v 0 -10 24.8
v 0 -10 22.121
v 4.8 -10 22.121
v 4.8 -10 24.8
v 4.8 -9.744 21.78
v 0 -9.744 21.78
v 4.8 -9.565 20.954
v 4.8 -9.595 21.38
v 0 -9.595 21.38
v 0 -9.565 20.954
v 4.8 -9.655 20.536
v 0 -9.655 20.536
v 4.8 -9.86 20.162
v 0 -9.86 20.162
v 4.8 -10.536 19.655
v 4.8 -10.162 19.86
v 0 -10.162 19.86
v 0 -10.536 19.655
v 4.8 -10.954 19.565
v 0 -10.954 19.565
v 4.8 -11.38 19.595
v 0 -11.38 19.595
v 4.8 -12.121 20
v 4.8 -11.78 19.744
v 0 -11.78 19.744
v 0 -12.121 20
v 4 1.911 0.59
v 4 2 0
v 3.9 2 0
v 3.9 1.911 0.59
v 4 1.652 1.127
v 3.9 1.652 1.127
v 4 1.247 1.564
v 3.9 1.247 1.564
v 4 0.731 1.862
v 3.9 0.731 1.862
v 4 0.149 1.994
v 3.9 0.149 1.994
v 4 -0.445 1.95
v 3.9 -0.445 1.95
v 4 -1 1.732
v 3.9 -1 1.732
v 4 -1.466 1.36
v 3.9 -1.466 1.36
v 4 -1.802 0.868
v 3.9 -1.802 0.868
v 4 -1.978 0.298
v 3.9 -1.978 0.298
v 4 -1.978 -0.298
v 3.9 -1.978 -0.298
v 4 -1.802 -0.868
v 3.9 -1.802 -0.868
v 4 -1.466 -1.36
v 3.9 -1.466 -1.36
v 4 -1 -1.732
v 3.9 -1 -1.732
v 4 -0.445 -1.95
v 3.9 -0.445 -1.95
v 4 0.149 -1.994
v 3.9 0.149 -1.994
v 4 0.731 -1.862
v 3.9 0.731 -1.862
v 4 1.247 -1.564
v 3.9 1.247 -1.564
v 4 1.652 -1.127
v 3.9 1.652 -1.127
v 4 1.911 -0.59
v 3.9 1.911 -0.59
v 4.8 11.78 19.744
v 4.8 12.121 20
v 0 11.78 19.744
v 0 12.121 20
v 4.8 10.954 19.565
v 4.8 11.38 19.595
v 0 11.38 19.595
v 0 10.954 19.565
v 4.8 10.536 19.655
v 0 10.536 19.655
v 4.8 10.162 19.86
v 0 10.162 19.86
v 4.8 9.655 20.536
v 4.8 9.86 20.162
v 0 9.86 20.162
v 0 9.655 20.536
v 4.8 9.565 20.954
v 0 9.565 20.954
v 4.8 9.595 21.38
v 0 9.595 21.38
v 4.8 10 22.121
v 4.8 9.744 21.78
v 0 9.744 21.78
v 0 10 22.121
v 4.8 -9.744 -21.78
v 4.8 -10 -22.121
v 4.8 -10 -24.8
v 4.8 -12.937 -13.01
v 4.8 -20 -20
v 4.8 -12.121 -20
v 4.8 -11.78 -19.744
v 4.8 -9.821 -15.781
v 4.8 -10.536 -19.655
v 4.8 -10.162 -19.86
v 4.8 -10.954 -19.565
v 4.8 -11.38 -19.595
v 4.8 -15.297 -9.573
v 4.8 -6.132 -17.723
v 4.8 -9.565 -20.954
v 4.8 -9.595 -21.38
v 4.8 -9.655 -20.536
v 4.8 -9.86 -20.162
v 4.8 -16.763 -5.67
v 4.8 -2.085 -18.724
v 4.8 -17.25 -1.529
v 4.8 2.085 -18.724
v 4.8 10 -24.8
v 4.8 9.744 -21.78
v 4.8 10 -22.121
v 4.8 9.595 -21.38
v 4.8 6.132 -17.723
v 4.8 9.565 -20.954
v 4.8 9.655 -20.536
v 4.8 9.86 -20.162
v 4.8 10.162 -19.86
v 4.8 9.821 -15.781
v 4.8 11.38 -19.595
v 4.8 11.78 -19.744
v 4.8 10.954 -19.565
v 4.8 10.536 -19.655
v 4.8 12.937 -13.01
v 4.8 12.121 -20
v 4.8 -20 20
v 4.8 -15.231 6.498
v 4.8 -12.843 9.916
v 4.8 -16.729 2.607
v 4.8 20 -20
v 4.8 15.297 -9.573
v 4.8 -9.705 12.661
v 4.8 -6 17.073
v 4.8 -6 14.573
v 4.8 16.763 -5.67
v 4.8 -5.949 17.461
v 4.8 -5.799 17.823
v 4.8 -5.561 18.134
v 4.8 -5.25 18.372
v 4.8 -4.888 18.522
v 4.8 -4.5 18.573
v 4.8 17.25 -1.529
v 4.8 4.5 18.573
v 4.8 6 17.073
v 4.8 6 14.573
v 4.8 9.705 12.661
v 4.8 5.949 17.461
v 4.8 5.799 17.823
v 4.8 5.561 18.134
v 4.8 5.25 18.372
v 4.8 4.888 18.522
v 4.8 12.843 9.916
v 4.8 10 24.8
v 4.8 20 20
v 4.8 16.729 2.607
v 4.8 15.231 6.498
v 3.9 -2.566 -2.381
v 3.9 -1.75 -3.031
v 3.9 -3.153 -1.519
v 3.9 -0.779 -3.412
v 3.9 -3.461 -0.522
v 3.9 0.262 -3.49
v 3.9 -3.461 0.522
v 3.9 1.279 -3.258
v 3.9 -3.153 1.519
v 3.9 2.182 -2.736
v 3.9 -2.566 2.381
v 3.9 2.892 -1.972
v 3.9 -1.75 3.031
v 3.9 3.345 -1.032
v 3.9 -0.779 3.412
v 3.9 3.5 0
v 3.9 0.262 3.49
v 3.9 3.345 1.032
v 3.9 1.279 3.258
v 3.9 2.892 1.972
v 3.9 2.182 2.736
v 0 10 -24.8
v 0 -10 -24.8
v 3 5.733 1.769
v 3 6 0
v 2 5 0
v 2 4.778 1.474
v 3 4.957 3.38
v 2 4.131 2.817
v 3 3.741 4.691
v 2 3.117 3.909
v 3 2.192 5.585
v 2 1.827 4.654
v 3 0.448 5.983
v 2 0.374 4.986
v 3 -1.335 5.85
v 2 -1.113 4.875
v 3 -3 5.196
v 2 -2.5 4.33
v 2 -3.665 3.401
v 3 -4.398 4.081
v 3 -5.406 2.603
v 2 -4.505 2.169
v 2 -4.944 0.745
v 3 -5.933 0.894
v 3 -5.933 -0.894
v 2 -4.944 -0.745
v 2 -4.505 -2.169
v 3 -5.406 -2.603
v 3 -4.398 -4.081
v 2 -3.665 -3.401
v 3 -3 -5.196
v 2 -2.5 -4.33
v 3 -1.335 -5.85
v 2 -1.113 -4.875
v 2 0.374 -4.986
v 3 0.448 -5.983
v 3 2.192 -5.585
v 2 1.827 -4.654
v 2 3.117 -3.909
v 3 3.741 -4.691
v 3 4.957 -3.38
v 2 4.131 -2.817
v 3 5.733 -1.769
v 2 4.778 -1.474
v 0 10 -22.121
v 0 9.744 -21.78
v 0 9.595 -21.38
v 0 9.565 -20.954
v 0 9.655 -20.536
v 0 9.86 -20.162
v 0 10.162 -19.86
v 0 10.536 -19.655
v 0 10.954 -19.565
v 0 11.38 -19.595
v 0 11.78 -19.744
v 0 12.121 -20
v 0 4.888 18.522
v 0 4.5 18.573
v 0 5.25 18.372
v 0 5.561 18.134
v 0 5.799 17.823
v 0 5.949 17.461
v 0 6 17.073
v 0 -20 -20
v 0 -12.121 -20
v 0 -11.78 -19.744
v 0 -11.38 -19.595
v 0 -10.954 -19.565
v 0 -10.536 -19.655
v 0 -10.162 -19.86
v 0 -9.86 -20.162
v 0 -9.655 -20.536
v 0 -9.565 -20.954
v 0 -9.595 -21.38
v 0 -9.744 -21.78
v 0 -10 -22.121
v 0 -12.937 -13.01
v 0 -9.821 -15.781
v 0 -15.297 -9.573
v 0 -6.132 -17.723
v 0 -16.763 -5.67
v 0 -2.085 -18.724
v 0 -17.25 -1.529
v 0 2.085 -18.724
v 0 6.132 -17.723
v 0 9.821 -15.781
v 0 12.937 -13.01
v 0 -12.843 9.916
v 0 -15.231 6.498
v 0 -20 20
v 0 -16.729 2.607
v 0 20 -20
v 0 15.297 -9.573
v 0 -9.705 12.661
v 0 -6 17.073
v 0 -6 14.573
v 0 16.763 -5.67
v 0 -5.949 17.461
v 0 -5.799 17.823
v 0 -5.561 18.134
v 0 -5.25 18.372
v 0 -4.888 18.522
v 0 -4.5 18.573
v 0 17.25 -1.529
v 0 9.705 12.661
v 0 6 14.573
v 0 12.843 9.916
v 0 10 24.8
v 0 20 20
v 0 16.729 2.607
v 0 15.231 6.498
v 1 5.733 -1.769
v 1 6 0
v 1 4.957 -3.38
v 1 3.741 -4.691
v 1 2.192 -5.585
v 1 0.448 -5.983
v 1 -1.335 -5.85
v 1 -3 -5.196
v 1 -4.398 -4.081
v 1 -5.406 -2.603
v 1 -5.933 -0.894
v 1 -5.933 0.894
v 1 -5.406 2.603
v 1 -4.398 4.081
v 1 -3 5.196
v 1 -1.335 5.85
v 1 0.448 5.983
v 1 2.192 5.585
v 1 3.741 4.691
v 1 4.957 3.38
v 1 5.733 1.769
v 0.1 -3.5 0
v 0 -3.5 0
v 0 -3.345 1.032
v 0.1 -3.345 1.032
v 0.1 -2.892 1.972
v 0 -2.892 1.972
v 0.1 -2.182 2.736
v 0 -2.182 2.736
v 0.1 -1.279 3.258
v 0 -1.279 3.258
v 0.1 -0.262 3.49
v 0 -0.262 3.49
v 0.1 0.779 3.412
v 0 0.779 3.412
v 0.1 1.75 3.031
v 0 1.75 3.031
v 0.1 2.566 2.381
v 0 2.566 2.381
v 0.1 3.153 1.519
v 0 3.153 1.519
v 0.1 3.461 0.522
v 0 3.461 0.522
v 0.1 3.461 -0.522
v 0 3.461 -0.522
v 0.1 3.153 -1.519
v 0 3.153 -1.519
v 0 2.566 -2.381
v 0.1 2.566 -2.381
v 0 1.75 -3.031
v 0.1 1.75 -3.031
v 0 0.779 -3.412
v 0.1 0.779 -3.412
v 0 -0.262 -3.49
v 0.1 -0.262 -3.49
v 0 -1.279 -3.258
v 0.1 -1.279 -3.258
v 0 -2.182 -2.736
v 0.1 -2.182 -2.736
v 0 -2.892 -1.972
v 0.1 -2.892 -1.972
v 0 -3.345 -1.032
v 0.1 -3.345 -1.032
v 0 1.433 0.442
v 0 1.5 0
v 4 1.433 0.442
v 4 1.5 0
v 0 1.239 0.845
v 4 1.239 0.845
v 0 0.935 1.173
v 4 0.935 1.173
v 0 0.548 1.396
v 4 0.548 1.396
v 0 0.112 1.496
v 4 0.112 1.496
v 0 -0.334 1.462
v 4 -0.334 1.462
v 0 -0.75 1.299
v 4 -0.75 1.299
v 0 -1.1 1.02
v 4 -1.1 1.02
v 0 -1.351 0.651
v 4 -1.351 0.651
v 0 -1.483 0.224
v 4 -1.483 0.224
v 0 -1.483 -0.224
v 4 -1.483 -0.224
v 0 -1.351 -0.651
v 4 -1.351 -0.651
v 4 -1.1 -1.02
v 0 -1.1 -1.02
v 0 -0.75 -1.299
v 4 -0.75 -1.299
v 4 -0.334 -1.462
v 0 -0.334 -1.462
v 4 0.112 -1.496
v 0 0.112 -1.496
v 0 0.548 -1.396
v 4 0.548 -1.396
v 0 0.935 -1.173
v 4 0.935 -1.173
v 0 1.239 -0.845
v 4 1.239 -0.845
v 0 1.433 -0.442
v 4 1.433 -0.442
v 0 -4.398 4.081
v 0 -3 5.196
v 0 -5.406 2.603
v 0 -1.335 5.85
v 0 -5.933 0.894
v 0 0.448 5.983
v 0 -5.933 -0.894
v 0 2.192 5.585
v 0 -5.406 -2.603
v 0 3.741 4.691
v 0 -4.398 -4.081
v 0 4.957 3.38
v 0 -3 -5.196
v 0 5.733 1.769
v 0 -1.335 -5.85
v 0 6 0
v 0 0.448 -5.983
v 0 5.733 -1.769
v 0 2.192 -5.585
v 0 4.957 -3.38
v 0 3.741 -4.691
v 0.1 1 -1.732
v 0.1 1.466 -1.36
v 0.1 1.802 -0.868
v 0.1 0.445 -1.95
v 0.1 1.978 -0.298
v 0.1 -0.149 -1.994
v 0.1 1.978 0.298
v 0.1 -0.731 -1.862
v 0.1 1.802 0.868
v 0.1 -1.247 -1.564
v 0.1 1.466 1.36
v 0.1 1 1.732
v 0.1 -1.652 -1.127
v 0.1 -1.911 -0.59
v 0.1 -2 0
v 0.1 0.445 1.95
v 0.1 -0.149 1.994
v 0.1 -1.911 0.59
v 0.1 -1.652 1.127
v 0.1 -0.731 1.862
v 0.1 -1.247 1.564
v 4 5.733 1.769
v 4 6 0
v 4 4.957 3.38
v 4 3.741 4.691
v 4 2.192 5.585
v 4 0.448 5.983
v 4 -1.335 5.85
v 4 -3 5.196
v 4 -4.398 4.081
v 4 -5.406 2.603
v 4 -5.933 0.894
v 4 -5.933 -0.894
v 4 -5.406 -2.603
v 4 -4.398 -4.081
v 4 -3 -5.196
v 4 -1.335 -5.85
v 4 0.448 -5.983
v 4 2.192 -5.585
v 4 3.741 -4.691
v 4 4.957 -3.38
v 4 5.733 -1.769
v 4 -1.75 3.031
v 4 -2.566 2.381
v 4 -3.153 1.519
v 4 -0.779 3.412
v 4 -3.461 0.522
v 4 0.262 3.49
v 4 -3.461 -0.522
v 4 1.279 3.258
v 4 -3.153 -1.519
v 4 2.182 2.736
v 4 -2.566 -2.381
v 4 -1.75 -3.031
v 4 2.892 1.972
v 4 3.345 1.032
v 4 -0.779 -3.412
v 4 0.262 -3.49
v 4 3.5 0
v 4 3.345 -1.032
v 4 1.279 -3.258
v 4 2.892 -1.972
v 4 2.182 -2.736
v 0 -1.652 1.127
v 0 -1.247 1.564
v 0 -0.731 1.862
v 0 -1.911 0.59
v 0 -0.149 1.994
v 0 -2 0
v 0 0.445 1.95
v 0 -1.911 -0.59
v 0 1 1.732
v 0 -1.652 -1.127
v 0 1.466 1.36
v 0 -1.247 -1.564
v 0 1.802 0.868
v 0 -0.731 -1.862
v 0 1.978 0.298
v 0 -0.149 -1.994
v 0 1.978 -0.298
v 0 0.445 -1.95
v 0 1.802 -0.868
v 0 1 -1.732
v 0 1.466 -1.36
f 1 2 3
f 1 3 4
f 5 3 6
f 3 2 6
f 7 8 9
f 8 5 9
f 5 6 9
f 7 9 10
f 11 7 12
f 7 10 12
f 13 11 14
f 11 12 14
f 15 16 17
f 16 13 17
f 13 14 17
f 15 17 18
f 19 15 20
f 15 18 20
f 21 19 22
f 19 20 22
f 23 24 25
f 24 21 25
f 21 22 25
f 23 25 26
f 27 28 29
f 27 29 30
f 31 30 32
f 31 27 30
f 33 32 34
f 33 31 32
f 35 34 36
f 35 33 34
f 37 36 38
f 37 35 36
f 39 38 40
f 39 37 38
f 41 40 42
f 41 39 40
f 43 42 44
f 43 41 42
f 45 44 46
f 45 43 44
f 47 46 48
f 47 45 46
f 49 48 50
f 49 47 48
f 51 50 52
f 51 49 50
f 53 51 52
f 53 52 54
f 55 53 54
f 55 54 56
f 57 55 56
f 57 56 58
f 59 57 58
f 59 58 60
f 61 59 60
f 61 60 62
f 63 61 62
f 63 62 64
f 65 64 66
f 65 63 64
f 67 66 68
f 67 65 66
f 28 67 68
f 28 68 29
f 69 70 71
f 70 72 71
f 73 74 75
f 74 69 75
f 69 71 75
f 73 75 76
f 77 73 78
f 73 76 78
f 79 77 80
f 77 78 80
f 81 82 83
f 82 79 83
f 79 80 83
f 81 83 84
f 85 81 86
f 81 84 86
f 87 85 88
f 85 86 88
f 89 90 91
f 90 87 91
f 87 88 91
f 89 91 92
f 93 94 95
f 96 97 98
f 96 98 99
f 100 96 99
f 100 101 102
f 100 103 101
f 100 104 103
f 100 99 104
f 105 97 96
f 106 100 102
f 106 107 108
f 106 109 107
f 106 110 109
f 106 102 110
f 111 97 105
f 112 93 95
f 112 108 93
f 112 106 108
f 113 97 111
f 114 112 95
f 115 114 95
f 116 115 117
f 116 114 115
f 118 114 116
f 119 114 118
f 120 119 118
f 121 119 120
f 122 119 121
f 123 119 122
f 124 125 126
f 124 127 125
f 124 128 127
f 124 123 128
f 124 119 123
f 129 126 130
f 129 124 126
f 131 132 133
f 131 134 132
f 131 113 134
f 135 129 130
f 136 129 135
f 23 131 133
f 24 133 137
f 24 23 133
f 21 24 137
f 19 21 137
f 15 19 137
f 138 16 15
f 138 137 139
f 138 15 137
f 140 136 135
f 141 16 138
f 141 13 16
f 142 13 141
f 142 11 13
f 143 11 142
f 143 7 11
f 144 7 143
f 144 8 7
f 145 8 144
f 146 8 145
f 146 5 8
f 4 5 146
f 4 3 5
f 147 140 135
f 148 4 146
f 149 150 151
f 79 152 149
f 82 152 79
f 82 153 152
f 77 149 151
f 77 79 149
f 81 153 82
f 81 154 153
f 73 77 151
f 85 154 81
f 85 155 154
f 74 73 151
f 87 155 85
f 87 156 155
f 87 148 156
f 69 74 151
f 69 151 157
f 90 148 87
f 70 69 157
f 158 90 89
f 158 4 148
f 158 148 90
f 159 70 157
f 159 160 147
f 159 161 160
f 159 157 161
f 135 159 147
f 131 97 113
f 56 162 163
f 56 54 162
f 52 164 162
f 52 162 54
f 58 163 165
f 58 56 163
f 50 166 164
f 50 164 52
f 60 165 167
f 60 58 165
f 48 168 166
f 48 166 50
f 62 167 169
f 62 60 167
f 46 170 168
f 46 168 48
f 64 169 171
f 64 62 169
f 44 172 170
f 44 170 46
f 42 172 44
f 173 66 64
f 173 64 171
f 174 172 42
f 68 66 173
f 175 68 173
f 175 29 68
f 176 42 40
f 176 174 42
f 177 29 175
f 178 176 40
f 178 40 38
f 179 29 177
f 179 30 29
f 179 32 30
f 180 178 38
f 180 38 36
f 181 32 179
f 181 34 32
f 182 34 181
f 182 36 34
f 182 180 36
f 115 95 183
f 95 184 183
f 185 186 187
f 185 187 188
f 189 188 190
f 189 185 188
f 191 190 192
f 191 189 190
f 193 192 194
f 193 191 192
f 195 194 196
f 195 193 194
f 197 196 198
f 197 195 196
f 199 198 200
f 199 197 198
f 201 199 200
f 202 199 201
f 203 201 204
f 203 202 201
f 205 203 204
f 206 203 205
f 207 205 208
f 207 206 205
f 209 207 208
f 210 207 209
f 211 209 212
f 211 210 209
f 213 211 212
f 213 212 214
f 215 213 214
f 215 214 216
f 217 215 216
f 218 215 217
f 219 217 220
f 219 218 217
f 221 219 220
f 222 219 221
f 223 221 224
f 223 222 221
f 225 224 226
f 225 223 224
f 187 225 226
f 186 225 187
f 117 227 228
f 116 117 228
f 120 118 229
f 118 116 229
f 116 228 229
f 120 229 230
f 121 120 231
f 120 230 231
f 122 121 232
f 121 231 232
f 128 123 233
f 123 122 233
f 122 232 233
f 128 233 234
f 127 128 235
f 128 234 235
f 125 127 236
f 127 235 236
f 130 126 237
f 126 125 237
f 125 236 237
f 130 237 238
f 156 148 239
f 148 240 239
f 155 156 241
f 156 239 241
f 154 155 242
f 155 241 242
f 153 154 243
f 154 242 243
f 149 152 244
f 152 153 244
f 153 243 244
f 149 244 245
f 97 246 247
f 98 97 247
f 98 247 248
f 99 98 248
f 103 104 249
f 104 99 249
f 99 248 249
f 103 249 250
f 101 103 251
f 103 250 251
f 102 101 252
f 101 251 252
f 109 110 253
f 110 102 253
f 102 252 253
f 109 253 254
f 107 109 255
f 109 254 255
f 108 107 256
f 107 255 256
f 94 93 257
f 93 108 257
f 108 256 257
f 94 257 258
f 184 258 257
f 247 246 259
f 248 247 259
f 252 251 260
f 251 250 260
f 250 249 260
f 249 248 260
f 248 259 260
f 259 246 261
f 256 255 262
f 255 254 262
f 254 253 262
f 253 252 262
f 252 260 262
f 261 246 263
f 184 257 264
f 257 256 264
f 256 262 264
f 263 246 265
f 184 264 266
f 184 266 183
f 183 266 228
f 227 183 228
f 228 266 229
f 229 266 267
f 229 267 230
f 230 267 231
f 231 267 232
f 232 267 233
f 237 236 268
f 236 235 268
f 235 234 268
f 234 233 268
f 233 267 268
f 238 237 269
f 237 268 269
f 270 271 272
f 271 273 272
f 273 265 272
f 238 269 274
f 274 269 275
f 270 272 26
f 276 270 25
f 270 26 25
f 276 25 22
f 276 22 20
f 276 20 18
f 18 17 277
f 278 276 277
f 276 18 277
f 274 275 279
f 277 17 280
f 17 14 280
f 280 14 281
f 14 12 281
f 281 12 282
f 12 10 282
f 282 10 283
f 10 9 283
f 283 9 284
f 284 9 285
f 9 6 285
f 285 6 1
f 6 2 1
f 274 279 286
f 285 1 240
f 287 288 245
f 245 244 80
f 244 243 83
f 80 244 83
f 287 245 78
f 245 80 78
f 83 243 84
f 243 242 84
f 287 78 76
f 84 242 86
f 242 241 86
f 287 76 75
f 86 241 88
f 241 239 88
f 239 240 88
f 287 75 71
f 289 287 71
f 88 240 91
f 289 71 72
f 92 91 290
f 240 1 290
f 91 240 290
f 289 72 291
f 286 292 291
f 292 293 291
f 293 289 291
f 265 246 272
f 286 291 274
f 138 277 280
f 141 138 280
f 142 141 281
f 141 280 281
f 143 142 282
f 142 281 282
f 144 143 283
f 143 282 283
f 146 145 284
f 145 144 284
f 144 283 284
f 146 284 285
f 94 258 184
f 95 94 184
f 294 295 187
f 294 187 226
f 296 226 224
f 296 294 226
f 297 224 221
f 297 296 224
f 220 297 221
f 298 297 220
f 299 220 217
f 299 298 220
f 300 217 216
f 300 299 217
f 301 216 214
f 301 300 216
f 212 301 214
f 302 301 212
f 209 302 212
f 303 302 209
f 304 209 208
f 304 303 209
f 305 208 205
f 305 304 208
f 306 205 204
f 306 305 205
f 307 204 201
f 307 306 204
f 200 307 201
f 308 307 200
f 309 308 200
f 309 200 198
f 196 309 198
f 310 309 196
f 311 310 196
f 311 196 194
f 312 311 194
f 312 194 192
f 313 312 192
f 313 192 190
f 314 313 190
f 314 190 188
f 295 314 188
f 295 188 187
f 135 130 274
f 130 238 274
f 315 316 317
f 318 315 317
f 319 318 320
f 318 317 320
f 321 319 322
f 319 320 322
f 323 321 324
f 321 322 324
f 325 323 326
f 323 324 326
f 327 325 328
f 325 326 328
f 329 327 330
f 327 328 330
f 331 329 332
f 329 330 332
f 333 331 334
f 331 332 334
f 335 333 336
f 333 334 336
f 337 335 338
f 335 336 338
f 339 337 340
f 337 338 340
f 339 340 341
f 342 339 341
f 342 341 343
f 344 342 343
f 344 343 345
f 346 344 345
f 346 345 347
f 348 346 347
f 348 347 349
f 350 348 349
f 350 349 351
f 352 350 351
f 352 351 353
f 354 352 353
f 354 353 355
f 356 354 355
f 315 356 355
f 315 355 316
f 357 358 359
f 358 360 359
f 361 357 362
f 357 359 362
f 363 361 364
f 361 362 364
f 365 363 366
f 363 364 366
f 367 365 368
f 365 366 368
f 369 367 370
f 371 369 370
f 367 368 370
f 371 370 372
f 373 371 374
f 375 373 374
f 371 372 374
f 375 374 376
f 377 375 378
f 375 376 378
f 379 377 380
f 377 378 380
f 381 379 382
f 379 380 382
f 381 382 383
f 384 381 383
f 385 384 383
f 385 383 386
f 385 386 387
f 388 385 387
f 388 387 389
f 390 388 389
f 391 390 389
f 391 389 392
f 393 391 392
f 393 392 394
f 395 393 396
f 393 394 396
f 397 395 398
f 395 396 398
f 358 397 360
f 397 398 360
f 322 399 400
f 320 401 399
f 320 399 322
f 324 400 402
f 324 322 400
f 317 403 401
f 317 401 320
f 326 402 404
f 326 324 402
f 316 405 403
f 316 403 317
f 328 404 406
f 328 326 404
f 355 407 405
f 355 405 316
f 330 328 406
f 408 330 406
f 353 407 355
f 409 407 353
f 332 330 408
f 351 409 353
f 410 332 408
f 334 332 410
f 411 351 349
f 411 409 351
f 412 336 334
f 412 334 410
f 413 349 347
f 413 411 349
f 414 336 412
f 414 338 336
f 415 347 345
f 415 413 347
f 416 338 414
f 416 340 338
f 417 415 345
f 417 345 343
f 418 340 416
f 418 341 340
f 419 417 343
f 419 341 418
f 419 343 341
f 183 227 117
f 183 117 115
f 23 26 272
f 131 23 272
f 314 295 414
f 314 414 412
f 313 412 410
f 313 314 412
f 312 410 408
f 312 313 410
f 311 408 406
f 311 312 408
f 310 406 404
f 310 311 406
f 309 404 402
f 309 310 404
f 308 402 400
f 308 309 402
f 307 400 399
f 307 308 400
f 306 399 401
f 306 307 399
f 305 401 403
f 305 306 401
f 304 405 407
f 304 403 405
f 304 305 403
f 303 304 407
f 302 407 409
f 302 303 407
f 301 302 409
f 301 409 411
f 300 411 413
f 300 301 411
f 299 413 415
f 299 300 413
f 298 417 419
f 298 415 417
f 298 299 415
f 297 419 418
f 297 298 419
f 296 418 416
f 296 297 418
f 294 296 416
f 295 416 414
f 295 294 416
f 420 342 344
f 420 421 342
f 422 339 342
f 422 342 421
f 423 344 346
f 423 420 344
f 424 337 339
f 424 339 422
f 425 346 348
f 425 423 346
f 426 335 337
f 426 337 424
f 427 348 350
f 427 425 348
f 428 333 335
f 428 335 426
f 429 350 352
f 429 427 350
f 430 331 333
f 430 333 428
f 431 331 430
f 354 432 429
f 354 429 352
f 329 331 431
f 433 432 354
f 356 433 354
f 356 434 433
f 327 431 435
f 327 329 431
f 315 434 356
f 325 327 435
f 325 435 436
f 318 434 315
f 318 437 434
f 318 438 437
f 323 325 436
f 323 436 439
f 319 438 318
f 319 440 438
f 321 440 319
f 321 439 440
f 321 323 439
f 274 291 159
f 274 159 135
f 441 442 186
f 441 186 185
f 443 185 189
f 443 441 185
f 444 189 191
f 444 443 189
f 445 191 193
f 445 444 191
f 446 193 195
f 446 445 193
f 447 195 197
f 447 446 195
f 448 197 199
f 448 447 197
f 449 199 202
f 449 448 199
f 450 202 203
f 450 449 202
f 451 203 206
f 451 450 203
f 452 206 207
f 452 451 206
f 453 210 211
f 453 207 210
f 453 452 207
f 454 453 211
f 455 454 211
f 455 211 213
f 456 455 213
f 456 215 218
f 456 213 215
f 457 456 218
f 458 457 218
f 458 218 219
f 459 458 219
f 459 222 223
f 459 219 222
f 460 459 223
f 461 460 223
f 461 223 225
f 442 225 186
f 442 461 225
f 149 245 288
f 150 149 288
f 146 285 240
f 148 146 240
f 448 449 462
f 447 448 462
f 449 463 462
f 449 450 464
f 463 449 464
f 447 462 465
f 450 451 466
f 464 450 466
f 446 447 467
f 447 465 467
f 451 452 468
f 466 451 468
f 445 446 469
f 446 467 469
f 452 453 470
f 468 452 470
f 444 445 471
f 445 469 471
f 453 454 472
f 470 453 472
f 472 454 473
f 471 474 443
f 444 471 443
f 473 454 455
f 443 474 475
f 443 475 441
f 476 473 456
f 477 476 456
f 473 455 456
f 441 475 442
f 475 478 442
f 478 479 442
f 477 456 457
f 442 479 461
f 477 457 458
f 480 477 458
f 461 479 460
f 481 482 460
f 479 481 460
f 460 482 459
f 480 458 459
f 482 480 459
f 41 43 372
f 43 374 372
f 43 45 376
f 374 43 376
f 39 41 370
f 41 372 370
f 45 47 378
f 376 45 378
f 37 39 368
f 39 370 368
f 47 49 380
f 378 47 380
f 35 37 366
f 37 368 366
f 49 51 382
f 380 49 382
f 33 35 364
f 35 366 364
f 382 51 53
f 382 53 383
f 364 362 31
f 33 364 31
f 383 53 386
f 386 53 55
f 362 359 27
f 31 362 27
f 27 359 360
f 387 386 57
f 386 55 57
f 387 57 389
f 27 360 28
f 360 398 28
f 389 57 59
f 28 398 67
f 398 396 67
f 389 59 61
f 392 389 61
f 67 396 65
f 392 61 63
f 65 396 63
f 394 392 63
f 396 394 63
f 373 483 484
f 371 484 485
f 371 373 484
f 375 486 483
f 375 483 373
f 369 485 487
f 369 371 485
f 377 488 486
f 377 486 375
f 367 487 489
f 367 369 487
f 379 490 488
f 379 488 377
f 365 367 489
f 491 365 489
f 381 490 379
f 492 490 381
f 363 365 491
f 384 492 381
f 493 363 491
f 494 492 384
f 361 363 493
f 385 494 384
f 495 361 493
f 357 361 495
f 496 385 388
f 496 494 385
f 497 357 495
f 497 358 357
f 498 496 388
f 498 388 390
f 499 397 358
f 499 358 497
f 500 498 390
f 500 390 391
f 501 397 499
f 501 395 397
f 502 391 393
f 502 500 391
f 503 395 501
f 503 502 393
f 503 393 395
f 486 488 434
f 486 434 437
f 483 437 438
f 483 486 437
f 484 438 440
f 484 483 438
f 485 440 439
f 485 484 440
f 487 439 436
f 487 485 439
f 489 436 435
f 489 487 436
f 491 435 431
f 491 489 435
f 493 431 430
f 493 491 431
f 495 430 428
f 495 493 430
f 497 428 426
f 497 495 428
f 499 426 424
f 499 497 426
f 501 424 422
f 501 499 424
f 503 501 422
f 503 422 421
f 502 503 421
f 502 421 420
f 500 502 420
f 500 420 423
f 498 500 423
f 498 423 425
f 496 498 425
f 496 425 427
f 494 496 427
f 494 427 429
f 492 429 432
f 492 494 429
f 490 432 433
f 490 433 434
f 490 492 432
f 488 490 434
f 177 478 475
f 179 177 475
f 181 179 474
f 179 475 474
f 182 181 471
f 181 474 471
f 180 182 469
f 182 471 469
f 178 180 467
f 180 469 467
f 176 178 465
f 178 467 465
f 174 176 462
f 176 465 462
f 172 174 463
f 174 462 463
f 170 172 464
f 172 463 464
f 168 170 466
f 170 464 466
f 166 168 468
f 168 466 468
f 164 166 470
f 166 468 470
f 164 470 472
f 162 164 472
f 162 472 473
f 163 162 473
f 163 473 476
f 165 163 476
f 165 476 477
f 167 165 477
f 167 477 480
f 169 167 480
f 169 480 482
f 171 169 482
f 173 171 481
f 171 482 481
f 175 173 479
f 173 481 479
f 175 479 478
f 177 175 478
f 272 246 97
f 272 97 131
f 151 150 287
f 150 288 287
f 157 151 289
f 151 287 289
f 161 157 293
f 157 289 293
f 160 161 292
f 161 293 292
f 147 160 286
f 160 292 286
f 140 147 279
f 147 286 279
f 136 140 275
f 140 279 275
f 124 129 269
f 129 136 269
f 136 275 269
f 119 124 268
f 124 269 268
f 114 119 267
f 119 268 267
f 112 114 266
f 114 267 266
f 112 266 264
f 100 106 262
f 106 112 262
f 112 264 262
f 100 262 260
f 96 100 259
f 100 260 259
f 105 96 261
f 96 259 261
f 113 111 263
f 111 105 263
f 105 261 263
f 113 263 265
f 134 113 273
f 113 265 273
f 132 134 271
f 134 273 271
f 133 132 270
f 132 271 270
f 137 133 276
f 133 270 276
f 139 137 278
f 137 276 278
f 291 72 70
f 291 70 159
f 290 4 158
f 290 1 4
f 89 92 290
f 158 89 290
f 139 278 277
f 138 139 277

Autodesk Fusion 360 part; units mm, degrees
sketch "Sketch2" plane through (0, 0, 0) normal (0, 0, 1) x (1, 0, 0)
  line L0 (0, 0) -> (0, 6)
  line L1 (4, 6) -> (4, 0)
  line L2 (4, 0) -> (0, 0)
  line L3 (1, 6) -> (2, 5)
  line L4 (2, 5) -> (3, 6)
  line L5 (0, 6) -> (1, 6)
  line L6 (3, 6) -> (4, 6)
  dimension "d12" = 4
  dimension "d13" = 1
  dimension "d14" = 1
  dimension "d15" = 6
revolve "Revolve1" add sketch "Sketch2" angle 360 about axis through (4, 0, 0) along (-1, 0, 0)
sketch "Sketch3" plane through (4, 0, 0) normal (1, 0, 0) x (0, 1, 0)
  circle A0 centre (0, 0) radius 6
  circle A1 centre (0, 0) radius 1.5
  dimension "d18" = 3
extrude "Extrude2" cut sketch "Sketch3" against normal through all contours A1
sketch "Sketch4" plane through (4, 0, 0) normal (1, 0, 0) x (0, 1, 0)
  circle A0 centre (0, 0) radius 1.5
  circle A1 centre (0, 0) radius 6
  circle A2 centre (0, 0) radius 3.5
  circle A3 centre (0, 0) radius 2
  dimension "d20" = 7
  dimension "d21" = 4
extrude "Extrude3" cut sketch "Sketch4" against normal blind 0.1 contours A2
sketch "Sketch5" plane through (0, 0, 0) normal (-1, 0, 0) x (0, -1, 0)
  circle A0 centre (0, 0) radius 1.5
  circle A1 centre (0, 0) radius 6
  circle A2 centre (0, 0) radius 2
  circle A3 centre (0, 0) radius 3.5
  dimension "d24" = 7
  dimension "d25" = 4
extrude "Extrude4" cut sketch "Sketch5" against normal blind 0.1 contours A3

Autodesk Fusion 360 part; units mm, degrees
sketch "Sketch1" plane through (0, 0, 0) normal (1, 0, 0) x (0, 1, 0)
  line L0 (-20, 20) -> (20, 20) construction
  line L1 (20, 20) -> (20, -20)
  line L2 (20, -20) -> (-20, -20) construction
  line L3 (-20, -20) -> (-20, 20)
  line L4 (0, 0) -> (0, 20) construction
  line L5 (0, 0) -> (20, 0) construction
  line L6 (0, 0) -> (0, -1.6) construction
  line L7 (0, 0) -> (0, -8.6) construction
  circle A0 centre (0, -8.6) radius 6
  circle A1 centre (0, -1.6) radius 18.4 construction
  circle A2 centre (0, -1.6) radius 15.5 construction
  line L8 (0, -1.6) -> (15.5, -1.6) construction
  circle A3 centre (15.5, -1.6) radius 1.5
  circle A4 centre (7.75, 11.8234) radius 1.5
  circle A5 centre (-7.75, 11.8234) radius 1.5
  circle A6 centre (-15.5, -1.6) radius 1.5
  circle A7 centre (-7.75, -15.0234) radius 1.5
  circle A8 centre (7.75, -15.0234) radius 1.5
  line L9 (-10, 20) -> (-10, 24.8) construction
  line L10 (-10, 24.8) -> (10, 24.8)
  line L11 (10, 24.8) -> (10, 20) construction
  line L12 (-10, -20) -> (-10, -24.8) construction
  line L13 (-10, -24.8) -> (10, -24.8)
  line L14 (10, -24.8) -> (10, -20) construction
  line L15 (-11.0607, -21.0607) -> (-10, -20) construction
  line L16 (11.0607, -21.0607) -> (10, -20) construction
  line L17 (-11.0607, 21.0607) -> (-10, 20) construction
  line L18 (11.0607, 21.0607) -> (10, 20) construction
  arc A9 (-12.1213, 20) -> (-10, 22.1213) centre (-11.0607, 21.0607) ccw
  arc A10 (-10, 22.1213) -> (-12.1213, 20) centre (-11.0607, 21.0607) ccw construction
  arc A11 (10, 22.1213) -> (12.1213, 20) centre (11.0607, 21.0607) ccw
  arc A12 (12.1213, 20) -> (10, 22.1213) centre (11.0607, 21.0607) ccw construction
  arc A13 (12.1213, -20) -> (10, -22.1213) centre (11.0607, -21.0607) ccw
  arc A14 (10, -22.1213) -> (12.1213, -20) centre (11.0607, -21.0607) ccw construction
  arc A15 (-10, -22.1213) -> (-12.1213, -20) centre (-11.0607, -21.0607) ccw
  arc A16 (-12.1213, -20) -> (-10, -22.1213) centre (-11.0607, -21.0607) ccw construction
  line L19 (-10, 22.1213) -> (-10, 24.8)
  line L20 (-12.1213, 20) -> (-20, 20)
  line L21 (10, 22.1213) -> (10, 24.8)
  line L22 (12.1213, 20) -> (20, 20)
  line L23 (10, -22.1213) -> (10, -24.8)
  line L24 (12.1213, -20) -> (20, -20)
  line L25 (-10, -22.1213) -> (-10, -24.8)
  line L26 (-12.1213, -20) -> (-20, -20)
  dimension "d61" = 40
  dimension "d62" = 40
  dimension "d63" = 1.6
  dimension "d65" = 12
  dimension "d66" = 36.8
  dimension "d67" = 31
  dimension "d68" = 3
  dimension "d70" = 360
  dimension "d71" = 4.8
  dimension "d72" = 20
  dimension "d73" = 10
  dimension "d74" = 4.8
  dimension "d75" = 20
  dimension "d76" = 10
  dimension "d77" = 3
  dimension "d78" = 1.5
  dimension "d79" = 45
  dimension "d80" = 3
  dimension "d81" = 1.5
  dimension "d83" = 45
  dimension "d84" = 3
  dimension "d85" = 3
  dimension "d86" = 1.5
  dimension "d87" = 45
  dimension "d88" = 1.5
  dimension "d89" = 45
  dimension "d90" = 7
extrude "Extrude1" add sketch "Sketch1" along normal blind 4.8

Autodesk Fusion 360 part; units mm, degrees
sketch "Sketch1" plane through (0, 0, 0) normal (1, 0, 0) x (0, 1, 0)
  line L0 (-20, 20) -> (20, 20) construction
  line L1 (20, 20) -> (20, -20)
  line L2 (20, -20) -> (-20, -20) construction
  line L3 (-20, -20) -> (-20, 20)
  line L4 (0, 0) -> (20, 0) construction
  line L5 (0, 0) -> (0, 20) construction
  line L6 (-10, 20) -> (-10, 24.8) construction
  line L7 (-10, 24.8) -> (10, 24.8)
  line L8 (10, 24.8) -> (10, 20) construction
  line L9 (-10, -20) -> (-10, -24.8) construction
  line L10 (-10, -24.8) -> (10, -24.8)
  line L11 (10, -24.8) -> (10, -20) construction
  line L12 (0, 0) -> (0, -1.6) construction
  line L13 (-6, 17.0729) -> (-6, 18.5729) construction
  line L14 (-6, 18.5729) -> (6, 18.5729) construction
  line L15 (6, 18.5729) -> (6, 17.0729) construction
  line L16 (-11.0607, 21.0607) -> (-10, 20) construction
  line L17 (11.0607, 21.0607) -> (10, 20) construction
  line L18 (11.0607, -21.0607) -> (10, -20) construction
  line L19 (-11.0607, -21.0607) -> (-10, -20) construction
  arc A0 (-6, 17.0729) -> (-4.5, 18.5729) centre (-4.5, 17.0729) ccw construction
  arc A1 (-4.5, 18.5729) -> (-6, 17.0729) centre (-4.5, 17.0729) ccw
  arc A2 (4.5, 18.5729) -> (6, 17.0729) centre (4.5, 17.0729) ccw construction
  arc A3 (6, 17.0729) -> (4.5, 18.5729) centre (4.5, 17.0729) ccw
  line L20 (-6, 14.5729) -> (-6, 17.0729)
  line L21 (6, 17.0729) -> (6, 14.5729)
  arc A4 (-6, 14.5729) -> (6, 14.5729) centre (0, -1.6) ccw
  arc A5 (6, 14.5729) -> (0, 15.65) centre (0, -1.6) ccw construction
  arc A6 (0, 15.65) -> (-6, 14.5729) centre (0, -1.6) ccw construction
  line L22 (-4.5, 18.5729) -> (4.5, 18.5729)
  arc A7 (-12.1213, 20) -> (-10, 22.1213) centre (-11.0607, 21.0607) ccw
  arc A8 (-10, 22.1213) -> (-12.1213, 20) centre (-11.0607, 21.0607) ccw construction
  arc A9 (10, 22.1213) -> (12.1213, 20) centre (11.0607, 21.0607) ccw
  arc A10 (12.1213, 20) -> (10, 22.1213) centre (11.0607, 21.0607) ccw construction
  arc A11 (-10, -22.1213) -> (-12.1213, -20) centre (-11.0607, -21.0607) ccw
  arc A12 (-12.1213, -20) -> (-10, -22.1213) centre (-11.0607, -21.0607) ccw construction
  arc A13 (12.1213, -20) -> (10, -22.1213) centre (11.0607, -21.0607) ccw
  arc A14 (10, -22.1213) -> (12.1213, -20) centre (11.0607, -21.0607) ccw construction
  line L23 (-10, 22.1213) -> (-10, 24.8)
  line L24 (10, 22.1213) -> (10, 24.8)
  line L25 (12.1213, 20) -> (20, 20)
  line L26 (-12.1213, 20) -> (-20, 20)
  line L27 (-20, -20) -> (-12.1213, -20)
  line L28 (-10, -22.1213) -> (-10, -24.8)
  line L29 (10, -22.1213) -> (10, -24.8)
  line L30 (12.1213, -20) -> (20, -20)
  point P0 (0, 18.5729)
  dimension "d39" = 40
  dimension "d40" = 40
  dimension "d41" = 4.8
  dimension "d42" = 20
  dimension "d43" = 10
  dimension "d44" = 4.8
  dimension "d45" = 20
  dimension "d46" = 10
  dimension "d47" = 1.6
  dimension "d48" = 34.5
  dimension "d49" = 4
  dimension "d51" = 3
  dimension "d52" = 1.5
  dimension "d53" = 45
  dimension "d54" = 3
  dimension "d55" = 3
  dimension "d56" = 3
  dimension "d57" = 1.5
  dimension "d58" = 45
  dimension "d59" = 3
  dimension "d60" = 1.5
  dimension "d61" = 45
  dimension "d62" = 3
  dimension "d63" = 1.5
  dimension "d64" = 45
  dimension "d65" = 12
extrude "Extrude1" add sketch "Sketch1" along normal blind 4.8
